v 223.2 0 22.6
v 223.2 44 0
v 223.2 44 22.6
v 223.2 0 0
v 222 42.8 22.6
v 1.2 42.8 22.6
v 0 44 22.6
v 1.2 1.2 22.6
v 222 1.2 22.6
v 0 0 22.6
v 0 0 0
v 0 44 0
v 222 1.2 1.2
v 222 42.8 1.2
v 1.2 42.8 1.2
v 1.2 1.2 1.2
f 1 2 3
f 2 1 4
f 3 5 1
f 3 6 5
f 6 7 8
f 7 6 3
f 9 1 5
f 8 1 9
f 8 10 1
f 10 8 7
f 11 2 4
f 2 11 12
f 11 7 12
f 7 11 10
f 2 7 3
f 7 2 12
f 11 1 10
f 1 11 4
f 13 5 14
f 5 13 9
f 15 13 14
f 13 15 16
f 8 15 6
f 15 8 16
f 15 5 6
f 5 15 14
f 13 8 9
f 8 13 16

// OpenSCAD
// GENERATED by calculations/generate_hardware_dummies.py
// MP-04 ENVELOPE/BALLAST DUMMIES — NOT AIRWORTHY; NOT FLIGHT HARDWARE
// Dimensions are external catalog/bounded envelopes in millimetres.
// Connector sweeps, cooling volumes, tolerances and mounts are separate measurements.

PART = "pack_6s1p_p42a_flat_narrow";
$fn = 72;

module open_ballast_box(size) {
    wall = min([1.2, size[0]/4, size[1]/4, size[2]/2]);
    difference() {
        cube(size, center=false);
        translate([wall, wall, wall])
            cube([size[0]-2*wall, size[1]-2*wall, size[2]-wall+0.02], center=false);
    }
}

module open_motor_shell(length, diameter) {
    wall = min([1.2, length/3, diameter/5]);
    rotate([0, 90, 0]) difference() {
        cylinder(h=length, d=diameter);
        translate([0, 0, wall]) cylinder(h=length, d=diameter-2*wall);
    }
}

// pack_6s1p_p42a / flat-narrow; [D]: 3x2x1-A; maximum cells plus wrap, nickel and folded-lead allowance
module dummy_pack_6s1p_p42a_flat_narrow() {
    open_ballast_box([223.2, 44, 22.6]);
}

// pack_6s1p_p42a / flat-moderate; [D]: 6x1x1-B; maximum cells plus wrap, nickel and folded-lead allowance
module dummy_pack_6s1p_p42a_flat_moderate() {
    open_ballast_box([142.8, 70.8, 22.6]);
}

// pack_8s1p_p42a / flat-narrow; [D]: 4x2x1-A; maximum cells plus wrap, nickel and folded-lead allowance
module dummy_pack_8s1p_p42a_flat_narrow() {
    open_ballast_box([293.4, 44, 22.6]);
}

// pack_8s1p_p42a / flat-moderate; [D]: 8x1x1-B; maximum cells plus wrap, nickel and folded-lead allowance
module dummy_pack_8s1p_p42a_flat_moderate() {
    open_ballast_box([186.2, 70.8, 22.6]);
}

// fc_6s / body; [M]: manufacturer LxWxH
module dummy_fc_6s_body() {
    open_ballast_box([36.5, 36.5, 7]);
}

// pdb_6s / body-bound; [M]/[E]: planform and mass manufacturer data; thickness is an installation estimate
module dummy_pdb_6s_body_bound() {
    open_ballast_box([36.5, 36.5, 5]);
}

// fc_pdb_8s_class / station-bound; [D]/[E]: I-17 all-board service cavity; not a component body
module dummy_fc_pdb_8s_class_station_bound() {
    open_ballast_box([64, 45, 21]);
}

// elevon_servos / body; [M]: catalog LxWxH per servo
module dummy_elevon_servos_body() {
    open_ballast_box([22.5, 11.5, 24.6]);
}

// rudder_servo_reserve / reserved-pocket; [D]/[E]: I-18 catalog maximum plus clearance; deliberately larger than the reference part
module dummy_rudder_servo_reserve_reserved_pocket() {
    open_ballast_box([34, 16, 39]);
}

// o4_camera / body; [M]: DJI LxWxH
module dummy_o4_camera_body() {
    open_ballast_box([13.44, 12.36, 16.5]);
}

// o4_vtx_antenna / vtx-body; [M]: DJI transmission-module LxWxH; antenna route separate
module dummy_o4_vtx_antenna_vtx_body() {
    open_ballast_box([30, 30, 6]);
}

// gps_mag / body; [M]: manufacturer LxWxH
module dummy_gps_mag_body() {
    open_ballast_box([20, 20, 12.4]);
}

// pitot_sensor / board-bound; [E]: existing packaging bound; manufacturer mass but no released body dimensions in source
module dummy_pitot_sensor_board_bound() {
    open_ballast_box([30, 20, 10]);
}

// receiver / body; [M]: manufacturer LxWxH without antenna
module dummy_receiver_body() {
    open_ballast_box([10, 10, 3]);
}

// buzzer / class-bound; [E]: existing packaging allowance
module dummy_buzzer_class_bound() {
    open_ballast_box([15, 15, 10]);
}

// blackbox_card / card; [M]: MicroSD form factor
module dummy_blackbox_card_card() {
    open_ballast_box([15, 11, 1]);
}

// MN3110 KV470; https://store.tmotor.com/product/mn3110-motor-navigator-type.html
module dummy_tmotor_mn3110_kv470() {
    open_motor_shell(28.5, 37.7);
}

// MN4010 KV475; https://store.tmotor.com/product/mn4010-kv580-motor-navigator-type.html
module dummy_tmotor_mn4010_kv475() {
    open_motor_shell(30.5, 44.7);
}

// MN4010 KV370; https://store.tmotor.com/product/mn4010-kv580-motor-navigator-type.html
module dummy_tmotor_mn4010_kv370() {
    open_motor_shell(30.5, 44.7);
}

// MN4012 KV400; https://store.tmotor.com/product/mn4012-kv480-motor-navigator-type.html
module dummy_tmotor_mn4012_kv400() {
    open_motor_shell(32.5, 44.7);
}

// 80F3[X]v2; https://powerdrives.net/80f3
module dummy_apd_80f3x_v2_6s() {
    open_ballast_box([44, 22, 12]);
}

// FlyFun 60A V5; https://www.hobbywing.com/uploads/file/20220817/308d789701a8209b133476865a0ac754.pdf
module dummy_hobbywing_flyfun_60a_v5() {
    open_ballast_box([69, 35, 18]);
}

// 120F3[X]v2; https://powerdrives.net/120f3
module dummy_apd_120f3x_v2_8s() {
    open_ballast_box([70, 30, 20]);
}

// FlyFun 80A V5; https://www.hobbywing.com/uploads/file/20220817/308d789701a8209b133476865a0ac754.pdf
module dummy_hobbywing_flyfun_80a_v5() {
    open_ballast_box([70, 35, 19]);
}

if (PART == "pack_6s1p_p42a_flat_narrow") dummy_pack_6s1p_p42a_flat_narrow();
else if (PART == "pack_6s1p_p42a_flat_moderate") dummy_pack_6s1p_p42a_flat_moderate();
else if (PART == "pack_8s1p_p42a_flat_narrow") dummy_pack_8s1p_p42a_flat_narrow();
else if (PART == "pack_8s1p_p42a_flat_moderate") dummy_pack_8s1p_p42a_flat_moderate();
else if (PART == "fc_6s_body") dummy_fc_6s_body();
else if (PART == "pdb_6s_body_bound") dummy_pdb_6s_body_bound();
else if (PART == "fc_pdb_8s_class_station_bound") dummy_fc_pdb_8s_class_station_bound();
else if (PART == "elevon_servos_body") dummy_elevon_servos_body();
else if (PART == "rudder_servo_reserve_reserved_pocket") dummy_rudder_servo_reserve_reserved_pocket();
else if (PART == "o4_camera_body") dummy_o4_camera_body();
else if (PART == "o4_vtx_antenna_vtx_body") dummy_o4_vtx_antenna_vtx_body();
else if (PART == "gps_mag_body") dummy_gps_mag_body();
else if (PART == "pitot_sensor_board_bound") dummy_pitot_sensor_board_bound();
else if (PART == "receiver_body") dummy_receiver_body();
else if (PART == "buzzer_class_bound") dummy_buzzer_class_bound();
else if (PART == "blackbox_card_card") dummy_blackbox_card_card();
else if (PART == "tmotor_mn3110_kv470") dummy_tmotor_mn3110_kv470();
else if (PART == "tmotor_mn4010_kv475") dummy_tmotor_mn4010_kv475();
else if (PART == "tmotor_mn4010_kv370") dummy_tmotor_mn4010_kv370();
else if (PART == "tmotor_mn4012_kv400") dummy_tmotor_mn4012_kv400();
else if (PART == "apd_80f3x_v2_6s") dummy_apd_80f3x_v2_6s();
else if (PART == "hobbywing_flyfun_60a_v5") dummy_hobbywing_flyfun_60a_v5();
else if (PART == "apd_120f3x_v2_8s") dummy_apd_120f3x_v2_8s();
else if (PART == "hobbywing_flyfun_80a_v5") dummy_hobbywing_flyfun_80a_v5();
else echo(str("Unknown PART: ", PART));
